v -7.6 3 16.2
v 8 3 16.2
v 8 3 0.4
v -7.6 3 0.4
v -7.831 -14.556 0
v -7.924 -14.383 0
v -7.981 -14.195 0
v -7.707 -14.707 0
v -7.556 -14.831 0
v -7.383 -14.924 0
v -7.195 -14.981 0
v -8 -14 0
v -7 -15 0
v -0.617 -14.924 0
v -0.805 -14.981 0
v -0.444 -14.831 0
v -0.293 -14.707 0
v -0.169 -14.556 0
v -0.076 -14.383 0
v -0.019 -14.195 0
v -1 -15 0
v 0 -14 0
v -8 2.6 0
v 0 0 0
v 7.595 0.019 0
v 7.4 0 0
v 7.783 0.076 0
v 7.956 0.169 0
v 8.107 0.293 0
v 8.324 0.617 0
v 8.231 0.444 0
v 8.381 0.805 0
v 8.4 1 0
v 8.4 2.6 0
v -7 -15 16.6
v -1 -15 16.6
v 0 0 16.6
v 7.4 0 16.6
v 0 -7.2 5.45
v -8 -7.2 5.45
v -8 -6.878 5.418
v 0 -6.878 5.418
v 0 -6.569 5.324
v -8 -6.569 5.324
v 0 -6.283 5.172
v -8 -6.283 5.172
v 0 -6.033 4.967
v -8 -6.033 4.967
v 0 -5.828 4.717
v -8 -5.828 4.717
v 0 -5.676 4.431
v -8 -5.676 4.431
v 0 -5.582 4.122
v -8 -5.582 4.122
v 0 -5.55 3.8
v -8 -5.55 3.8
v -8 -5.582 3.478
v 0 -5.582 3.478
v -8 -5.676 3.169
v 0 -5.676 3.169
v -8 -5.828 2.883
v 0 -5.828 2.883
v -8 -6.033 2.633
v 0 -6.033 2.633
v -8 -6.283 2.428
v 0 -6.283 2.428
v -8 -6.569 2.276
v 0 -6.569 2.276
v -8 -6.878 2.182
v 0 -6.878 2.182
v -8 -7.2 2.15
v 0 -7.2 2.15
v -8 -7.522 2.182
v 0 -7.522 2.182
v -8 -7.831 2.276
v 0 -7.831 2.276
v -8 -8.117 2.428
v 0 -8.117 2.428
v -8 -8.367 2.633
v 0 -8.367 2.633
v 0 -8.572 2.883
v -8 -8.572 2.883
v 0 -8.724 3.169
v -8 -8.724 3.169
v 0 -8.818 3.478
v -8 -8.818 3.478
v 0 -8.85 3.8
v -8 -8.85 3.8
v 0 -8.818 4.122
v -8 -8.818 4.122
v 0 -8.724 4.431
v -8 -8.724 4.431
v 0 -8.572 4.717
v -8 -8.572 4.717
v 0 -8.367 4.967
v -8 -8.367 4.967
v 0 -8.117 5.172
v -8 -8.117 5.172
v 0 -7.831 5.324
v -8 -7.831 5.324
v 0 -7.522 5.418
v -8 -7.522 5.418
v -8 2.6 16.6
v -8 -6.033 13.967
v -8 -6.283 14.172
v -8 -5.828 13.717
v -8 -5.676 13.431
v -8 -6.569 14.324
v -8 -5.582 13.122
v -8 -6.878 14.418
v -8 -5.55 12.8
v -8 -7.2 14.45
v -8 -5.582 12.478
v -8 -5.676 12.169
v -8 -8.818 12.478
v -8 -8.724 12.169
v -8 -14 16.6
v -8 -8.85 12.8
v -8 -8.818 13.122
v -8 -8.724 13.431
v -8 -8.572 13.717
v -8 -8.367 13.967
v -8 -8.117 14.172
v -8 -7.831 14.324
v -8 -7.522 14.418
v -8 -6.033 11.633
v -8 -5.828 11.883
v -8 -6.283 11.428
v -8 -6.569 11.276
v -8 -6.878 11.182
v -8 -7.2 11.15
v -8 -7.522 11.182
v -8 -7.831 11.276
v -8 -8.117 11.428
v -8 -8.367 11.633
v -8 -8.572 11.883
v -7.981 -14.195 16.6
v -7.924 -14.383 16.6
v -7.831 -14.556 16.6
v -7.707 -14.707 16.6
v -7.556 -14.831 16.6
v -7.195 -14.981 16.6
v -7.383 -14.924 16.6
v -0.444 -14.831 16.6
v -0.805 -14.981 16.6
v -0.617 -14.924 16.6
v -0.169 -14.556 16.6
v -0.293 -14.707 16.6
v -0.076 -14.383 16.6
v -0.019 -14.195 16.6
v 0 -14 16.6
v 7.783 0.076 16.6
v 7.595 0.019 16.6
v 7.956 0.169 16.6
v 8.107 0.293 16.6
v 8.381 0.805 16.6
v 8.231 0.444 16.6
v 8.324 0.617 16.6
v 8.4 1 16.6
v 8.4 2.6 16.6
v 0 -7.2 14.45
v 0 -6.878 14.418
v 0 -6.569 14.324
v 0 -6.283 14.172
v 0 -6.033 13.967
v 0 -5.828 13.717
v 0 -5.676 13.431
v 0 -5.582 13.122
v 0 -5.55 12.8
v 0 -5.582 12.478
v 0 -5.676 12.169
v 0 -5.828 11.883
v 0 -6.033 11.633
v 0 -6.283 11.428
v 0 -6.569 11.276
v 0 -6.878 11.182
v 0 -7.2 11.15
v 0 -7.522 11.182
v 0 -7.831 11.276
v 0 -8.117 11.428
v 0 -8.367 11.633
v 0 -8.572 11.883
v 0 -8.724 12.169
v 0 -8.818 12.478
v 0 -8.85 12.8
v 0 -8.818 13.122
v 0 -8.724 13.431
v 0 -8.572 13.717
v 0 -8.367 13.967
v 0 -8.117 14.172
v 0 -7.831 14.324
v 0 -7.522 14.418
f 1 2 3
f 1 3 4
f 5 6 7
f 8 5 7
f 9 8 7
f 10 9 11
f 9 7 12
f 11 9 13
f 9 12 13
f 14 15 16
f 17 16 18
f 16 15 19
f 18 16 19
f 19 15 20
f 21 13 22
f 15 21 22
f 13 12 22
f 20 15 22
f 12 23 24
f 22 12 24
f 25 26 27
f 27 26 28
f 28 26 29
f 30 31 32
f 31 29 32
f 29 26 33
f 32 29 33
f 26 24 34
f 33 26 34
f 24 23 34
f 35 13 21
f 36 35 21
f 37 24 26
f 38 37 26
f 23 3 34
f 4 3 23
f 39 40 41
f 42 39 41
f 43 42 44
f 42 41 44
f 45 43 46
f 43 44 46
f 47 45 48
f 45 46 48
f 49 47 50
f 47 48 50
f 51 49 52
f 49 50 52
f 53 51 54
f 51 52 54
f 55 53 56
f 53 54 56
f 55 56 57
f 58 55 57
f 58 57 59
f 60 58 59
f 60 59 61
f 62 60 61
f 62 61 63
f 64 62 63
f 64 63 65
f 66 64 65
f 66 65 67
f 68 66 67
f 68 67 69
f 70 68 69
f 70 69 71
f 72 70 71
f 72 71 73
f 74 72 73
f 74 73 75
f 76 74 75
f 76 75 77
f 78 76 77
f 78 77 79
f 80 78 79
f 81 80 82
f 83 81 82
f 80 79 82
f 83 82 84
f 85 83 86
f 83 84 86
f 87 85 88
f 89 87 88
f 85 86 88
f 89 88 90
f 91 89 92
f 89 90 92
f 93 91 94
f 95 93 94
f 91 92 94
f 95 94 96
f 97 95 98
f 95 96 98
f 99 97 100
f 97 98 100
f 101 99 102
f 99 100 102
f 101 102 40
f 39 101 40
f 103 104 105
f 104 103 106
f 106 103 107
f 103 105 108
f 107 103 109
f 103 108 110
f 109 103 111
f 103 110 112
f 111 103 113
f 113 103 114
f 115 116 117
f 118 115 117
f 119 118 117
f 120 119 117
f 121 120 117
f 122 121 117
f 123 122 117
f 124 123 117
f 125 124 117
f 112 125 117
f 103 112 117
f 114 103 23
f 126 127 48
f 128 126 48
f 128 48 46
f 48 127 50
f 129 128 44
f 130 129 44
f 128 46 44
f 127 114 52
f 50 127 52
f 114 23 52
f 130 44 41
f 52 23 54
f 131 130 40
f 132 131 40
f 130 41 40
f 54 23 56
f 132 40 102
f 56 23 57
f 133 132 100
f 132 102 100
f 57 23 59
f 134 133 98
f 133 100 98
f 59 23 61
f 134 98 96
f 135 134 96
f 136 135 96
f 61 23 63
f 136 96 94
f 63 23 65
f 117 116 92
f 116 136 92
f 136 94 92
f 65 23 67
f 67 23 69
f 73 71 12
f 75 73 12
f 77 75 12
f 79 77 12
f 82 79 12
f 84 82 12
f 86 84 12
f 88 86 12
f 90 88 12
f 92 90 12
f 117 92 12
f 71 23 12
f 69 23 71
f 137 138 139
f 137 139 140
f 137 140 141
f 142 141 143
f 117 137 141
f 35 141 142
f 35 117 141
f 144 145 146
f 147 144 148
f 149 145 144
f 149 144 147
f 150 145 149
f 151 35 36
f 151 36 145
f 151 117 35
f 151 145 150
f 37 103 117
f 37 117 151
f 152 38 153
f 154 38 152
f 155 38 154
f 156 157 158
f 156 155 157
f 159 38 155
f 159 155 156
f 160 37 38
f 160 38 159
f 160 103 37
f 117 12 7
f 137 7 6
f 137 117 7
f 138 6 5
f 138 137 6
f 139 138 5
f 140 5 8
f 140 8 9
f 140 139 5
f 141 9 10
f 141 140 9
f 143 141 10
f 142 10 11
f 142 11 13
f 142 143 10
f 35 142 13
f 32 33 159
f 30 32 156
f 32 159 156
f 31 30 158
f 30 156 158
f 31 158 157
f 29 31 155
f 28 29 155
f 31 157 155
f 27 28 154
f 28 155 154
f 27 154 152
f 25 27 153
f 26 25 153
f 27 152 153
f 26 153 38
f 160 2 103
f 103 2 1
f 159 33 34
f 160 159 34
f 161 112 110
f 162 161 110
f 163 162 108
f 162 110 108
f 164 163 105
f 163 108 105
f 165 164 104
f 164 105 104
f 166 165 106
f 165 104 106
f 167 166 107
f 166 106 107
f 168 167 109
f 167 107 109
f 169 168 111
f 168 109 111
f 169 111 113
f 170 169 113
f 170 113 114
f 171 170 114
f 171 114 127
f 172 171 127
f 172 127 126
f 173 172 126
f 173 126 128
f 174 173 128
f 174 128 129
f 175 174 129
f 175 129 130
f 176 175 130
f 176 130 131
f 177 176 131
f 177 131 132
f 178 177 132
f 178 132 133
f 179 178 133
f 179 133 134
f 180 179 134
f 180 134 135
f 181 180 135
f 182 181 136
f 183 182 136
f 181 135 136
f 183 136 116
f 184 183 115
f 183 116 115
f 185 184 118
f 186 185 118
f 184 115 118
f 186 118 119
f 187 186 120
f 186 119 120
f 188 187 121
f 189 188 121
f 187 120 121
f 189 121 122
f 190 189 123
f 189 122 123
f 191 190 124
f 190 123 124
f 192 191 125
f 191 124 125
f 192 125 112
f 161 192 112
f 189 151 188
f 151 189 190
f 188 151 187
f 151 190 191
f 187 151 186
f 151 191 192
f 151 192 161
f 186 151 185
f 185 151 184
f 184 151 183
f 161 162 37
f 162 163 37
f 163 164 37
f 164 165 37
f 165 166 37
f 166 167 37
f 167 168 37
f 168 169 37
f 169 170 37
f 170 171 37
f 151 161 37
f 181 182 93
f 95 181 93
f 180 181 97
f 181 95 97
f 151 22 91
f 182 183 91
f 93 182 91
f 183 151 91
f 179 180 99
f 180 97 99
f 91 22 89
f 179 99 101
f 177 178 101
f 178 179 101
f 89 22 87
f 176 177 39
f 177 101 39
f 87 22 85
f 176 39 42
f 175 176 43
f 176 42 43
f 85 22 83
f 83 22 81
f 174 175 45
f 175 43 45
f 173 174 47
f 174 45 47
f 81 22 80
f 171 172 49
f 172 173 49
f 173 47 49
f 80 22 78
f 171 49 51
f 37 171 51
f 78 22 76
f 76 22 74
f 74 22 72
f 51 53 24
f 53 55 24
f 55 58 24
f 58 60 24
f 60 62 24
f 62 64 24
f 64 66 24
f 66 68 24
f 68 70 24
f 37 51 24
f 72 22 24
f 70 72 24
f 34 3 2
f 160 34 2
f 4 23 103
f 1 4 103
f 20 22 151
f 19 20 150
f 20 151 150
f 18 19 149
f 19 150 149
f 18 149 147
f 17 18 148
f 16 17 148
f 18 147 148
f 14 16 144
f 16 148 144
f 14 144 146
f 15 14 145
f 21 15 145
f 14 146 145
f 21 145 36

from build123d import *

# Parameters (mm, degrees)
BOSS_EXTRUDE1_DEPTH = 16.6
SKETCH2_R           = 1.65
CUT_EXTRUDE1_DEPTH  = 17.4
CHAMFER1_SIZE       = 0.4
FILLET1_R           = 1


with BuildPart() as part:
    # Sketch1 → Boss-Extrude1 (new body)
    with BuildSketch(Plane.XY):
        Polygon((0, 0), (8.4, 0), (8.4, 3), (-8, 3), (-8, -15), (0, -15), align=None)
    extrude(amount=BOSS_EXTRUDE1_DEPTH)

    # Sketch2 → Cut-Extrude1 (cut, through all)
    with BuildSketch(Plane.ZY.offset(8)):
        with Locations((3.8, -7.2)):
            Circle(SKETCH2_R)
        with Locations((12.8, -7.2)):
            Circle(SKETCH2_R)
    extrude(amount=-CUT_EXTRUDE1_DEPTH, mode=Mode.SUBTRACT)

    # Chamfer1
    chamfer1_edges = [part.edges().sort_by_distance(p)[0] for p in [
        (-8, 3, 8.3),
        (8.4, 3, 8.3),
        (0.2, 3, 16.6),
        (0.2, 3, 0),
    ]]
    chamfer(chamfer1_edges, length=CHAMFER1_SIZE)

    # Fillet1
    fillet1_edges = [part.edges().sort_by_distance(p)[0] for p in [
        (0, -15, 8.3),
        (-8, -15, 8.3),
        (8.4, 0, 8.3),
    ]]
    fillet(fillet1_edges, radius=FILLET1_R)


solid = part.part
